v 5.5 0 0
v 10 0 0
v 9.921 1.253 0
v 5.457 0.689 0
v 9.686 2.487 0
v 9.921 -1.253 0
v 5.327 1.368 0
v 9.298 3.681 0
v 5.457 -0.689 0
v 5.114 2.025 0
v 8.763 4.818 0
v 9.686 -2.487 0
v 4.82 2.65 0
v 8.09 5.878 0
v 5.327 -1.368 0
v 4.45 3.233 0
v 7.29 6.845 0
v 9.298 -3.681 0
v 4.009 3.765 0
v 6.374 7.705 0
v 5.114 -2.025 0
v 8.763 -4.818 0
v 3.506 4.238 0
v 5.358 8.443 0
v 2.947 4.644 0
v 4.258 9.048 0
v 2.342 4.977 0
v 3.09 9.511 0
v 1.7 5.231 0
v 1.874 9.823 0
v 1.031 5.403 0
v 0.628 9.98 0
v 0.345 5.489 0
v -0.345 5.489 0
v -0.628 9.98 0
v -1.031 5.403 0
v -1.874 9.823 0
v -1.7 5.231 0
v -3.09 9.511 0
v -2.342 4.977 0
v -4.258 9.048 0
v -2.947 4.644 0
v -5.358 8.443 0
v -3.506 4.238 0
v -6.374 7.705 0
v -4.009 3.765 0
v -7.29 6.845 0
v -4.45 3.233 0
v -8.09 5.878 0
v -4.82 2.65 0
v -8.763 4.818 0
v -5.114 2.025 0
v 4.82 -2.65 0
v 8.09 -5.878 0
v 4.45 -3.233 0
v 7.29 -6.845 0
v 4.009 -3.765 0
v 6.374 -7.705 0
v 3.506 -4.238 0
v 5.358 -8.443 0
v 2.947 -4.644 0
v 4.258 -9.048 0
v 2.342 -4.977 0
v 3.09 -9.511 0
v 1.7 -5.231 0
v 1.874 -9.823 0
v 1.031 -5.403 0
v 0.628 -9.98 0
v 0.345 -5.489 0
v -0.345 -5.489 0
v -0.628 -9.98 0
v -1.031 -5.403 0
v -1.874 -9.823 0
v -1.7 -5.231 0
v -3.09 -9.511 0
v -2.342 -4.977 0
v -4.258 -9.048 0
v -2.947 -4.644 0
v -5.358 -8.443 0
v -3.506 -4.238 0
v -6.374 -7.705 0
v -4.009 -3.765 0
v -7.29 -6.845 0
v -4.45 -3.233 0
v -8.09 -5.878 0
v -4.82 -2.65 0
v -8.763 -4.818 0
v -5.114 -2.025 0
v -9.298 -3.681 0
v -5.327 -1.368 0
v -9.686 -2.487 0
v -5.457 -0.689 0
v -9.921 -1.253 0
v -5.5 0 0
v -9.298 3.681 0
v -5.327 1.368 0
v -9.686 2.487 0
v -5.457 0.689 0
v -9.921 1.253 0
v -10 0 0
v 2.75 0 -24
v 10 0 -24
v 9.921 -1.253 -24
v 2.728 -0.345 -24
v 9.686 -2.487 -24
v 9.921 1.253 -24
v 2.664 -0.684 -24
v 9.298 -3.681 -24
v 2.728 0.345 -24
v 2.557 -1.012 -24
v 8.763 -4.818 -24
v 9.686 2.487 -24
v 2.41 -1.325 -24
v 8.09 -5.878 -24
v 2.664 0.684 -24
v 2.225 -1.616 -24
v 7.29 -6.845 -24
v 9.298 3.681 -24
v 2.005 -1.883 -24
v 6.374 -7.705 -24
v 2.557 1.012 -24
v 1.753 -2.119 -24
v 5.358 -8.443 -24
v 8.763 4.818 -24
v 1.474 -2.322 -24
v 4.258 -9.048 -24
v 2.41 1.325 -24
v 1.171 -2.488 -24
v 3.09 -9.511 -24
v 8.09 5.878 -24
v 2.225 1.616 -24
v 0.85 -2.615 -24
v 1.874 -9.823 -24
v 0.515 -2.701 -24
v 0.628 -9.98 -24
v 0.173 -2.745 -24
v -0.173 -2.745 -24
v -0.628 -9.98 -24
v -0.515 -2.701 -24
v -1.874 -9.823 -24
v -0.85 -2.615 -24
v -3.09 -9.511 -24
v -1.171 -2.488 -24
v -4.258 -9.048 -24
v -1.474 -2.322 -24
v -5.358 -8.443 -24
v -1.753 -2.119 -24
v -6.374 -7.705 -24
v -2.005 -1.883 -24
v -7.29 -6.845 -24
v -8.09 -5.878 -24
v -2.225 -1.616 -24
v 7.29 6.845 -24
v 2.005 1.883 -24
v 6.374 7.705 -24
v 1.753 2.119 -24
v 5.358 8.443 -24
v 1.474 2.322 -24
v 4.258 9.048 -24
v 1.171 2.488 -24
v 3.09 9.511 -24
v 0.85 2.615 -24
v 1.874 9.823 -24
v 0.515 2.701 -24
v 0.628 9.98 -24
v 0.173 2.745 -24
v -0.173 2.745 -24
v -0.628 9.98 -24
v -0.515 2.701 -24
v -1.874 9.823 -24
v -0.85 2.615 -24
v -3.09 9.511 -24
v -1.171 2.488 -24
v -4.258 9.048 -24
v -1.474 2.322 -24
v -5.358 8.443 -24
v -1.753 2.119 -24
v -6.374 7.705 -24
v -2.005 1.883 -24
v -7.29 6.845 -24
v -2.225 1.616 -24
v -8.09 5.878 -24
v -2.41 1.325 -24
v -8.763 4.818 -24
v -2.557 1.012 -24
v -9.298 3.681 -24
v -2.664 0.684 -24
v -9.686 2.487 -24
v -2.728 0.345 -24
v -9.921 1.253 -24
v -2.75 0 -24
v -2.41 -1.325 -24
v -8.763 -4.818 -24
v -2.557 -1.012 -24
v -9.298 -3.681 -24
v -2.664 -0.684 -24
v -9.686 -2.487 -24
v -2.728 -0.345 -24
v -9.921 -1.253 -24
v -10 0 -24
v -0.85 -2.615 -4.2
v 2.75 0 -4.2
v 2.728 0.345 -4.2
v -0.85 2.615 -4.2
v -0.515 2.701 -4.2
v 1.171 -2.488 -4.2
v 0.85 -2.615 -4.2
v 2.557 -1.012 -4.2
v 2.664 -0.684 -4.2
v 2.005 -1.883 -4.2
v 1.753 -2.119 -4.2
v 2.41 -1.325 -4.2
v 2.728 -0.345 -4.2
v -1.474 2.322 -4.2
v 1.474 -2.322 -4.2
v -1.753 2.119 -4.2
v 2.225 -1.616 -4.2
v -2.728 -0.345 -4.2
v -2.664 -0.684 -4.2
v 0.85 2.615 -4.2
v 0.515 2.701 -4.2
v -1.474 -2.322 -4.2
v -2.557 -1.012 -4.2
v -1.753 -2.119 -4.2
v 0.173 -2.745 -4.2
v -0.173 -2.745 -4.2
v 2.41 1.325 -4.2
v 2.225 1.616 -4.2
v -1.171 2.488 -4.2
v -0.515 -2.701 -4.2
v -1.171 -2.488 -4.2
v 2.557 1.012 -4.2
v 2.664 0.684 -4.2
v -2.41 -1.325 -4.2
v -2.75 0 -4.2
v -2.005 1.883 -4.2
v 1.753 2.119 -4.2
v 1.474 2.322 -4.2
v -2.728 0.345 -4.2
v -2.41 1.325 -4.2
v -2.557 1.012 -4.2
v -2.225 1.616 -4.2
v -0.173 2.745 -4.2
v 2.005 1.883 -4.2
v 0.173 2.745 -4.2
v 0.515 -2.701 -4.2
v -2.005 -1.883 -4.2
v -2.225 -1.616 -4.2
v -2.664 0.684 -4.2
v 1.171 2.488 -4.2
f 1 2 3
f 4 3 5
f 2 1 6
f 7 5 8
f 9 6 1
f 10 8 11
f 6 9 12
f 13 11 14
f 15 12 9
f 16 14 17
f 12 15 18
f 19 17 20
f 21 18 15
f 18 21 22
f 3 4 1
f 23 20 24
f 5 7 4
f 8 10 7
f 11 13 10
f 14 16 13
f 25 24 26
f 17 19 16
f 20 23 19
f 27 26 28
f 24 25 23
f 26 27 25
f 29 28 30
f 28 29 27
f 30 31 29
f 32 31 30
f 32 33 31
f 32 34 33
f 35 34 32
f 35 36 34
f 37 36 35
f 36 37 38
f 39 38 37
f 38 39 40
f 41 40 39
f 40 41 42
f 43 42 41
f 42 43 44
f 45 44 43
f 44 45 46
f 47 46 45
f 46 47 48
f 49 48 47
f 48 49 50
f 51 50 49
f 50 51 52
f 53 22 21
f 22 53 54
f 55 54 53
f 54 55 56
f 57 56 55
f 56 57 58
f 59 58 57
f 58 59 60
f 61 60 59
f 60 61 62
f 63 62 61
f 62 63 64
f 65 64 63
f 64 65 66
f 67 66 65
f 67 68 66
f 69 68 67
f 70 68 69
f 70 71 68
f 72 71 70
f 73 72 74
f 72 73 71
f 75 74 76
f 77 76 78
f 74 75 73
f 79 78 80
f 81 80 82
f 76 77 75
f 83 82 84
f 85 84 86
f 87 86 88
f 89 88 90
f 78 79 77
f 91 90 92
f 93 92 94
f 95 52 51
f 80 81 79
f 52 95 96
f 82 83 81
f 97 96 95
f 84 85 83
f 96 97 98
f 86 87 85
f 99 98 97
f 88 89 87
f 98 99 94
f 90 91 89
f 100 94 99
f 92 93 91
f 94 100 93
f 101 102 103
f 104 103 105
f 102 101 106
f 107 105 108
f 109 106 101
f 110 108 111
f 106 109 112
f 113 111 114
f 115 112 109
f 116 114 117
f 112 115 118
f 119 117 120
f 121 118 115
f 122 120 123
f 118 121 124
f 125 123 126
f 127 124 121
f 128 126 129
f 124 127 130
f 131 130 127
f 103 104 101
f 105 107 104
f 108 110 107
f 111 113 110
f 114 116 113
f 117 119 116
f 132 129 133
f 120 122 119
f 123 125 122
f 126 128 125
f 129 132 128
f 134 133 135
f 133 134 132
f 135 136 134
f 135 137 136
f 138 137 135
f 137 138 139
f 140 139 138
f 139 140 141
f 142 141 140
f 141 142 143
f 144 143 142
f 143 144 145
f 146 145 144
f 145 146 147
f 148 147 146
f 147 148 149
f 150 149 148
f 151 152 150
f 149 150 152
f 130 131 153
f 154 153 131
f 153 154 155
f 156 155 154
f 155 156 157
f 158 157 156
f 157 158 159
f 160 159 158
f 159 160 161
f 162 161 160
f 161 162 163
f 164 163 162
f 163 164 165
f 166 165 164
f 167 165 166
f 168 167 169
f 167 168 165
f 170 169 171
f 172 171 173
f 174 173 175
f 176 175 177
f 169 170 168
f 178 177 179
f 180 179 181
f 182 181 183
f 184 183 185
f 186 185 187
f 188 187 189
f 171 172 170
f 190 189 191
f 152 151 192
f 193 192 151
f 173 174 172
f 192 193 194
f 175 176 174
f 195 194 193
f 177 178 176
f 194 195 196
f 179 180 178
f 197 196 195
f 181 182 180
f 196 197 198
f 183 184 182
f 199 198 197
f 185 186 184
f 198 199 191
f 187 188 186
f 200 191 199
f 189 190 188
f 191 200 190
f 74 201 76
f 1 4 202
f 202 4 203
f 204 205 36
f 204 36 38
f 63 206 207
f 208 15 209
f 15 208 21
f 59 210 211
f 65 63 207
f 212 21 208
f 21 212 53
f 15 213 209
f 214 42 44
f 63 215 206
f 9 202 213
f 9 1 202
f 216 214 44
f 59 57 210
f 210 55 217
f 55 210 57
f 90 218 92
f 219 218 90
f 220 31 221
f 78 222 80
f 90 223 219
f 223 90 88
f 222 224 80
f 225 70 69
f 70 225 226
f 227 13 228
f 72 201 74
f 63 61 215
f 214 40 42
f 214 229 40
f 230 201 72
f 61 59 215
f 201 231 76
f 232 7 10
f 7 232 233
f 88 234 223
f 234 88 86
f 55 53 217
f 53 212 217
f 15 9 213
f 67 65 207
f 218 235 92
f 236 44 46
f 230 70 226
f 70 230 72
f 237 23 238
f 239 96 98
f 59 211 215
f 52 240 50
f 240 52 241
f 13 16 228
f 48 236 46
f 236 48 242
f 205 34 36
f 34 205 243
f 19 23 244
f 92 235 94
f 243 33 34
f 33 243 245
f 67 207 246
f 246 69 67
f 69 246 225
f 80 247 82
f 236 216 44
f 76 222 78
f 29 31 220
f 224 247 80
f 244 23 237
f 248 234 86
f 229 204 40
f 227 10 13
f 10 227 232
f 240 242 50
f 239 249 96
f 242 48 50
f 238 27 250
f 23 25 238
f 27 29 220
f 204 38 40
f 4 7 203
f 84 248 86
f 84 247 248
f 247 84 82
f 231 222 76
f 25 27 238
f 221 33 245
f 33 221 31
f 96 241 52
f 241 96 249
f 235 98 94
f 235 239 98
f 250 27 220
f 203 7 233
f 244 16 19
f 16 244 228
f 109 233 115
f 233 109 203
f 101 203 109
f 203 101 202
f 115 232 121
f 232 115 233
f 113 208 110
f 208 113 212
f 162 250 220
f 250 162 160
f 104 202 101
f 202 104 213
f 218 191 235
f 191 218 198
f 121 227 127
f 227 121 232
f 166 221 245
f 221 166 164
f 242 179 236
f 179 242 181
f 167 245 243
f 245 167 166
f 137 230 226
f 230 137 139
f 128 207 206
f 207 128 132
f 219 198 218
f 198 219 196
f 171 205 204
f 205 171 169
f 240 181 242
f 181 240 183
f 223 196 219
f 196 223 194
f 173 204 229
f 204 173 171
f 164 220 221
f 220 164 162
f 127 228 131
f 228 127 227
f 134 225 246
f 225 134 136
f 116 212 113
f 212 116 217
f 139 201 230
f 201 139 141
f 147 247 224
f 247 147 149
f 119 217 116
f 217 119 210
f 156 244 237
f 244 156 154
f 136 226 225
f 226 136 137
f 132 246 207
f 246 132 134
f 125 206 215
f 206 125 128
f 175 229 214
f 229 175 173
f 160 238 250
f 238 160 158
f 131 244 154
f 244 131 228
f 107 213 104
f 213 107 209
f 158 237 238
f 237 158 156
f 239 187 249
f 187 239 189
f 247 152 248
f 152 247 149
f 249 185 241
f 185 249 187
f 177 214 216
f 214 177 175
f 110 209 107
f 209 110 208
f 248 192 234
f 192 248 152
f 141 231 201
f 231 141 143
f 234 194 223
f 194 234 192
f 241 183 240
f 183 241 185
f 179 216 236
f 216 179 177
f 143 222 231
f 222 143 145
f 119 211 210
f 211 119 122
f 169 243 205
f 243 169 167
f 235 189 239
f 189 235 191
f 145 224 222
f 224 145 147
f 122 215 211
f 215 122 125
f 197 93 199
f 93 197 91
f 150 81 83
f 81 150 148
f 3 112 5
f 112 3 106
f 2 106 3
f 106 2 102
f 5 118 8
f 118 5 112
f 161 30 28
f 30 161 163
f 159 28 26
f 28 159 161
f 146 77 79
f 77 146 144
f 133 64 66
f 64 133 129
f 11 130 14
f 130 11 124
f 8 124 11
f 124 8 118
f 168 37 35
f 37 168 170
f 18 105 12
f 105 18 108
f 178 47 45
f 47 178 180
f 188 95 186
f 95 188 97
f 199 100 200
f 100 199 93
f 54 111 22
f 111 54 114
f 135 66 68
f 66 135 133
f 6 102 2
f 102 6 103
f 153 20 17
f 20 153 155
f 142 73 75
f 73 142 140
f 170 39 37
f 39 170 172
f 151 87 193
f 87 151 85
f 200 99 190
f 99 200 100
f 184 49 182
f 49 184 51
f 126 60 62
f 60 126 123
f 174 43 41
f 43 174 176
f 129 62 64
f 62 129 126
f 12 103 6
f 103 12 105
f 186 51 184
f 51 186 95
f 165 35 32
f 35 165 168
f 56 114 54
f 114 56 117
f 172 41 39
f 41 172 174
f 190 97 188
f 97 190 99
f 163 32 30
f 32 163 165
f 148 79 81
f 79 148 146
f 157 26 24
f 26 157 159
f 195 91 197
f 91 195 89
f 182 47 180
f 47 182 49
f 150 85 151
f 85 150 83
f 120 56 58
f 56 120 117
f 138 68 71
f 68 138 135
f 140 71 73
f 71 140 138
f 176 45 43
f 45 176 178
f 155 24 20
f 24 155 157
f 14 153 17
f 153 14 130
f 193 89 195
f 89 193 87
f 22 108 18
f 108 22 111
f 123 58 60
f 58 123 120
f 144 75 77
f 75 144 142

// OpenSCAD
$fn = 50;


difference() {
	union() {
		translate(v = [0, 0, -24.0000000000]) {
			cylinder(h = 24, r = 10.0000000000);
		}
		cylinder(h = 0, r = 13.0000000000);
	}
	union() {
		translate(v = [0, 0, 0]) {
			rotate(a = [0, 0, 0]) {
				difference() {
					union() {
						#translate(v = [0, 0, -24.0000000000]) {
							cylinder(h = 24, r = 2.2500000000);
						}
						#translate(v = [0, 0, -4.2000000000]) {
							cylinder(h = 4.2000000000, r = 10.0000000000, r1 = 2.7500000000, r2 = 5.5000000000);
						}
						#translate(v = [0, 0, -24.0000000000]) {
							cylinder(h = 24, r = 2.7500000000);
						}
						#translate(v = [0, 0, -24.0000000000]) {
							cylinder(h = 24, r = 2.2500000000);
						}
					}
					union();
				}
			}
		}
	}
}
